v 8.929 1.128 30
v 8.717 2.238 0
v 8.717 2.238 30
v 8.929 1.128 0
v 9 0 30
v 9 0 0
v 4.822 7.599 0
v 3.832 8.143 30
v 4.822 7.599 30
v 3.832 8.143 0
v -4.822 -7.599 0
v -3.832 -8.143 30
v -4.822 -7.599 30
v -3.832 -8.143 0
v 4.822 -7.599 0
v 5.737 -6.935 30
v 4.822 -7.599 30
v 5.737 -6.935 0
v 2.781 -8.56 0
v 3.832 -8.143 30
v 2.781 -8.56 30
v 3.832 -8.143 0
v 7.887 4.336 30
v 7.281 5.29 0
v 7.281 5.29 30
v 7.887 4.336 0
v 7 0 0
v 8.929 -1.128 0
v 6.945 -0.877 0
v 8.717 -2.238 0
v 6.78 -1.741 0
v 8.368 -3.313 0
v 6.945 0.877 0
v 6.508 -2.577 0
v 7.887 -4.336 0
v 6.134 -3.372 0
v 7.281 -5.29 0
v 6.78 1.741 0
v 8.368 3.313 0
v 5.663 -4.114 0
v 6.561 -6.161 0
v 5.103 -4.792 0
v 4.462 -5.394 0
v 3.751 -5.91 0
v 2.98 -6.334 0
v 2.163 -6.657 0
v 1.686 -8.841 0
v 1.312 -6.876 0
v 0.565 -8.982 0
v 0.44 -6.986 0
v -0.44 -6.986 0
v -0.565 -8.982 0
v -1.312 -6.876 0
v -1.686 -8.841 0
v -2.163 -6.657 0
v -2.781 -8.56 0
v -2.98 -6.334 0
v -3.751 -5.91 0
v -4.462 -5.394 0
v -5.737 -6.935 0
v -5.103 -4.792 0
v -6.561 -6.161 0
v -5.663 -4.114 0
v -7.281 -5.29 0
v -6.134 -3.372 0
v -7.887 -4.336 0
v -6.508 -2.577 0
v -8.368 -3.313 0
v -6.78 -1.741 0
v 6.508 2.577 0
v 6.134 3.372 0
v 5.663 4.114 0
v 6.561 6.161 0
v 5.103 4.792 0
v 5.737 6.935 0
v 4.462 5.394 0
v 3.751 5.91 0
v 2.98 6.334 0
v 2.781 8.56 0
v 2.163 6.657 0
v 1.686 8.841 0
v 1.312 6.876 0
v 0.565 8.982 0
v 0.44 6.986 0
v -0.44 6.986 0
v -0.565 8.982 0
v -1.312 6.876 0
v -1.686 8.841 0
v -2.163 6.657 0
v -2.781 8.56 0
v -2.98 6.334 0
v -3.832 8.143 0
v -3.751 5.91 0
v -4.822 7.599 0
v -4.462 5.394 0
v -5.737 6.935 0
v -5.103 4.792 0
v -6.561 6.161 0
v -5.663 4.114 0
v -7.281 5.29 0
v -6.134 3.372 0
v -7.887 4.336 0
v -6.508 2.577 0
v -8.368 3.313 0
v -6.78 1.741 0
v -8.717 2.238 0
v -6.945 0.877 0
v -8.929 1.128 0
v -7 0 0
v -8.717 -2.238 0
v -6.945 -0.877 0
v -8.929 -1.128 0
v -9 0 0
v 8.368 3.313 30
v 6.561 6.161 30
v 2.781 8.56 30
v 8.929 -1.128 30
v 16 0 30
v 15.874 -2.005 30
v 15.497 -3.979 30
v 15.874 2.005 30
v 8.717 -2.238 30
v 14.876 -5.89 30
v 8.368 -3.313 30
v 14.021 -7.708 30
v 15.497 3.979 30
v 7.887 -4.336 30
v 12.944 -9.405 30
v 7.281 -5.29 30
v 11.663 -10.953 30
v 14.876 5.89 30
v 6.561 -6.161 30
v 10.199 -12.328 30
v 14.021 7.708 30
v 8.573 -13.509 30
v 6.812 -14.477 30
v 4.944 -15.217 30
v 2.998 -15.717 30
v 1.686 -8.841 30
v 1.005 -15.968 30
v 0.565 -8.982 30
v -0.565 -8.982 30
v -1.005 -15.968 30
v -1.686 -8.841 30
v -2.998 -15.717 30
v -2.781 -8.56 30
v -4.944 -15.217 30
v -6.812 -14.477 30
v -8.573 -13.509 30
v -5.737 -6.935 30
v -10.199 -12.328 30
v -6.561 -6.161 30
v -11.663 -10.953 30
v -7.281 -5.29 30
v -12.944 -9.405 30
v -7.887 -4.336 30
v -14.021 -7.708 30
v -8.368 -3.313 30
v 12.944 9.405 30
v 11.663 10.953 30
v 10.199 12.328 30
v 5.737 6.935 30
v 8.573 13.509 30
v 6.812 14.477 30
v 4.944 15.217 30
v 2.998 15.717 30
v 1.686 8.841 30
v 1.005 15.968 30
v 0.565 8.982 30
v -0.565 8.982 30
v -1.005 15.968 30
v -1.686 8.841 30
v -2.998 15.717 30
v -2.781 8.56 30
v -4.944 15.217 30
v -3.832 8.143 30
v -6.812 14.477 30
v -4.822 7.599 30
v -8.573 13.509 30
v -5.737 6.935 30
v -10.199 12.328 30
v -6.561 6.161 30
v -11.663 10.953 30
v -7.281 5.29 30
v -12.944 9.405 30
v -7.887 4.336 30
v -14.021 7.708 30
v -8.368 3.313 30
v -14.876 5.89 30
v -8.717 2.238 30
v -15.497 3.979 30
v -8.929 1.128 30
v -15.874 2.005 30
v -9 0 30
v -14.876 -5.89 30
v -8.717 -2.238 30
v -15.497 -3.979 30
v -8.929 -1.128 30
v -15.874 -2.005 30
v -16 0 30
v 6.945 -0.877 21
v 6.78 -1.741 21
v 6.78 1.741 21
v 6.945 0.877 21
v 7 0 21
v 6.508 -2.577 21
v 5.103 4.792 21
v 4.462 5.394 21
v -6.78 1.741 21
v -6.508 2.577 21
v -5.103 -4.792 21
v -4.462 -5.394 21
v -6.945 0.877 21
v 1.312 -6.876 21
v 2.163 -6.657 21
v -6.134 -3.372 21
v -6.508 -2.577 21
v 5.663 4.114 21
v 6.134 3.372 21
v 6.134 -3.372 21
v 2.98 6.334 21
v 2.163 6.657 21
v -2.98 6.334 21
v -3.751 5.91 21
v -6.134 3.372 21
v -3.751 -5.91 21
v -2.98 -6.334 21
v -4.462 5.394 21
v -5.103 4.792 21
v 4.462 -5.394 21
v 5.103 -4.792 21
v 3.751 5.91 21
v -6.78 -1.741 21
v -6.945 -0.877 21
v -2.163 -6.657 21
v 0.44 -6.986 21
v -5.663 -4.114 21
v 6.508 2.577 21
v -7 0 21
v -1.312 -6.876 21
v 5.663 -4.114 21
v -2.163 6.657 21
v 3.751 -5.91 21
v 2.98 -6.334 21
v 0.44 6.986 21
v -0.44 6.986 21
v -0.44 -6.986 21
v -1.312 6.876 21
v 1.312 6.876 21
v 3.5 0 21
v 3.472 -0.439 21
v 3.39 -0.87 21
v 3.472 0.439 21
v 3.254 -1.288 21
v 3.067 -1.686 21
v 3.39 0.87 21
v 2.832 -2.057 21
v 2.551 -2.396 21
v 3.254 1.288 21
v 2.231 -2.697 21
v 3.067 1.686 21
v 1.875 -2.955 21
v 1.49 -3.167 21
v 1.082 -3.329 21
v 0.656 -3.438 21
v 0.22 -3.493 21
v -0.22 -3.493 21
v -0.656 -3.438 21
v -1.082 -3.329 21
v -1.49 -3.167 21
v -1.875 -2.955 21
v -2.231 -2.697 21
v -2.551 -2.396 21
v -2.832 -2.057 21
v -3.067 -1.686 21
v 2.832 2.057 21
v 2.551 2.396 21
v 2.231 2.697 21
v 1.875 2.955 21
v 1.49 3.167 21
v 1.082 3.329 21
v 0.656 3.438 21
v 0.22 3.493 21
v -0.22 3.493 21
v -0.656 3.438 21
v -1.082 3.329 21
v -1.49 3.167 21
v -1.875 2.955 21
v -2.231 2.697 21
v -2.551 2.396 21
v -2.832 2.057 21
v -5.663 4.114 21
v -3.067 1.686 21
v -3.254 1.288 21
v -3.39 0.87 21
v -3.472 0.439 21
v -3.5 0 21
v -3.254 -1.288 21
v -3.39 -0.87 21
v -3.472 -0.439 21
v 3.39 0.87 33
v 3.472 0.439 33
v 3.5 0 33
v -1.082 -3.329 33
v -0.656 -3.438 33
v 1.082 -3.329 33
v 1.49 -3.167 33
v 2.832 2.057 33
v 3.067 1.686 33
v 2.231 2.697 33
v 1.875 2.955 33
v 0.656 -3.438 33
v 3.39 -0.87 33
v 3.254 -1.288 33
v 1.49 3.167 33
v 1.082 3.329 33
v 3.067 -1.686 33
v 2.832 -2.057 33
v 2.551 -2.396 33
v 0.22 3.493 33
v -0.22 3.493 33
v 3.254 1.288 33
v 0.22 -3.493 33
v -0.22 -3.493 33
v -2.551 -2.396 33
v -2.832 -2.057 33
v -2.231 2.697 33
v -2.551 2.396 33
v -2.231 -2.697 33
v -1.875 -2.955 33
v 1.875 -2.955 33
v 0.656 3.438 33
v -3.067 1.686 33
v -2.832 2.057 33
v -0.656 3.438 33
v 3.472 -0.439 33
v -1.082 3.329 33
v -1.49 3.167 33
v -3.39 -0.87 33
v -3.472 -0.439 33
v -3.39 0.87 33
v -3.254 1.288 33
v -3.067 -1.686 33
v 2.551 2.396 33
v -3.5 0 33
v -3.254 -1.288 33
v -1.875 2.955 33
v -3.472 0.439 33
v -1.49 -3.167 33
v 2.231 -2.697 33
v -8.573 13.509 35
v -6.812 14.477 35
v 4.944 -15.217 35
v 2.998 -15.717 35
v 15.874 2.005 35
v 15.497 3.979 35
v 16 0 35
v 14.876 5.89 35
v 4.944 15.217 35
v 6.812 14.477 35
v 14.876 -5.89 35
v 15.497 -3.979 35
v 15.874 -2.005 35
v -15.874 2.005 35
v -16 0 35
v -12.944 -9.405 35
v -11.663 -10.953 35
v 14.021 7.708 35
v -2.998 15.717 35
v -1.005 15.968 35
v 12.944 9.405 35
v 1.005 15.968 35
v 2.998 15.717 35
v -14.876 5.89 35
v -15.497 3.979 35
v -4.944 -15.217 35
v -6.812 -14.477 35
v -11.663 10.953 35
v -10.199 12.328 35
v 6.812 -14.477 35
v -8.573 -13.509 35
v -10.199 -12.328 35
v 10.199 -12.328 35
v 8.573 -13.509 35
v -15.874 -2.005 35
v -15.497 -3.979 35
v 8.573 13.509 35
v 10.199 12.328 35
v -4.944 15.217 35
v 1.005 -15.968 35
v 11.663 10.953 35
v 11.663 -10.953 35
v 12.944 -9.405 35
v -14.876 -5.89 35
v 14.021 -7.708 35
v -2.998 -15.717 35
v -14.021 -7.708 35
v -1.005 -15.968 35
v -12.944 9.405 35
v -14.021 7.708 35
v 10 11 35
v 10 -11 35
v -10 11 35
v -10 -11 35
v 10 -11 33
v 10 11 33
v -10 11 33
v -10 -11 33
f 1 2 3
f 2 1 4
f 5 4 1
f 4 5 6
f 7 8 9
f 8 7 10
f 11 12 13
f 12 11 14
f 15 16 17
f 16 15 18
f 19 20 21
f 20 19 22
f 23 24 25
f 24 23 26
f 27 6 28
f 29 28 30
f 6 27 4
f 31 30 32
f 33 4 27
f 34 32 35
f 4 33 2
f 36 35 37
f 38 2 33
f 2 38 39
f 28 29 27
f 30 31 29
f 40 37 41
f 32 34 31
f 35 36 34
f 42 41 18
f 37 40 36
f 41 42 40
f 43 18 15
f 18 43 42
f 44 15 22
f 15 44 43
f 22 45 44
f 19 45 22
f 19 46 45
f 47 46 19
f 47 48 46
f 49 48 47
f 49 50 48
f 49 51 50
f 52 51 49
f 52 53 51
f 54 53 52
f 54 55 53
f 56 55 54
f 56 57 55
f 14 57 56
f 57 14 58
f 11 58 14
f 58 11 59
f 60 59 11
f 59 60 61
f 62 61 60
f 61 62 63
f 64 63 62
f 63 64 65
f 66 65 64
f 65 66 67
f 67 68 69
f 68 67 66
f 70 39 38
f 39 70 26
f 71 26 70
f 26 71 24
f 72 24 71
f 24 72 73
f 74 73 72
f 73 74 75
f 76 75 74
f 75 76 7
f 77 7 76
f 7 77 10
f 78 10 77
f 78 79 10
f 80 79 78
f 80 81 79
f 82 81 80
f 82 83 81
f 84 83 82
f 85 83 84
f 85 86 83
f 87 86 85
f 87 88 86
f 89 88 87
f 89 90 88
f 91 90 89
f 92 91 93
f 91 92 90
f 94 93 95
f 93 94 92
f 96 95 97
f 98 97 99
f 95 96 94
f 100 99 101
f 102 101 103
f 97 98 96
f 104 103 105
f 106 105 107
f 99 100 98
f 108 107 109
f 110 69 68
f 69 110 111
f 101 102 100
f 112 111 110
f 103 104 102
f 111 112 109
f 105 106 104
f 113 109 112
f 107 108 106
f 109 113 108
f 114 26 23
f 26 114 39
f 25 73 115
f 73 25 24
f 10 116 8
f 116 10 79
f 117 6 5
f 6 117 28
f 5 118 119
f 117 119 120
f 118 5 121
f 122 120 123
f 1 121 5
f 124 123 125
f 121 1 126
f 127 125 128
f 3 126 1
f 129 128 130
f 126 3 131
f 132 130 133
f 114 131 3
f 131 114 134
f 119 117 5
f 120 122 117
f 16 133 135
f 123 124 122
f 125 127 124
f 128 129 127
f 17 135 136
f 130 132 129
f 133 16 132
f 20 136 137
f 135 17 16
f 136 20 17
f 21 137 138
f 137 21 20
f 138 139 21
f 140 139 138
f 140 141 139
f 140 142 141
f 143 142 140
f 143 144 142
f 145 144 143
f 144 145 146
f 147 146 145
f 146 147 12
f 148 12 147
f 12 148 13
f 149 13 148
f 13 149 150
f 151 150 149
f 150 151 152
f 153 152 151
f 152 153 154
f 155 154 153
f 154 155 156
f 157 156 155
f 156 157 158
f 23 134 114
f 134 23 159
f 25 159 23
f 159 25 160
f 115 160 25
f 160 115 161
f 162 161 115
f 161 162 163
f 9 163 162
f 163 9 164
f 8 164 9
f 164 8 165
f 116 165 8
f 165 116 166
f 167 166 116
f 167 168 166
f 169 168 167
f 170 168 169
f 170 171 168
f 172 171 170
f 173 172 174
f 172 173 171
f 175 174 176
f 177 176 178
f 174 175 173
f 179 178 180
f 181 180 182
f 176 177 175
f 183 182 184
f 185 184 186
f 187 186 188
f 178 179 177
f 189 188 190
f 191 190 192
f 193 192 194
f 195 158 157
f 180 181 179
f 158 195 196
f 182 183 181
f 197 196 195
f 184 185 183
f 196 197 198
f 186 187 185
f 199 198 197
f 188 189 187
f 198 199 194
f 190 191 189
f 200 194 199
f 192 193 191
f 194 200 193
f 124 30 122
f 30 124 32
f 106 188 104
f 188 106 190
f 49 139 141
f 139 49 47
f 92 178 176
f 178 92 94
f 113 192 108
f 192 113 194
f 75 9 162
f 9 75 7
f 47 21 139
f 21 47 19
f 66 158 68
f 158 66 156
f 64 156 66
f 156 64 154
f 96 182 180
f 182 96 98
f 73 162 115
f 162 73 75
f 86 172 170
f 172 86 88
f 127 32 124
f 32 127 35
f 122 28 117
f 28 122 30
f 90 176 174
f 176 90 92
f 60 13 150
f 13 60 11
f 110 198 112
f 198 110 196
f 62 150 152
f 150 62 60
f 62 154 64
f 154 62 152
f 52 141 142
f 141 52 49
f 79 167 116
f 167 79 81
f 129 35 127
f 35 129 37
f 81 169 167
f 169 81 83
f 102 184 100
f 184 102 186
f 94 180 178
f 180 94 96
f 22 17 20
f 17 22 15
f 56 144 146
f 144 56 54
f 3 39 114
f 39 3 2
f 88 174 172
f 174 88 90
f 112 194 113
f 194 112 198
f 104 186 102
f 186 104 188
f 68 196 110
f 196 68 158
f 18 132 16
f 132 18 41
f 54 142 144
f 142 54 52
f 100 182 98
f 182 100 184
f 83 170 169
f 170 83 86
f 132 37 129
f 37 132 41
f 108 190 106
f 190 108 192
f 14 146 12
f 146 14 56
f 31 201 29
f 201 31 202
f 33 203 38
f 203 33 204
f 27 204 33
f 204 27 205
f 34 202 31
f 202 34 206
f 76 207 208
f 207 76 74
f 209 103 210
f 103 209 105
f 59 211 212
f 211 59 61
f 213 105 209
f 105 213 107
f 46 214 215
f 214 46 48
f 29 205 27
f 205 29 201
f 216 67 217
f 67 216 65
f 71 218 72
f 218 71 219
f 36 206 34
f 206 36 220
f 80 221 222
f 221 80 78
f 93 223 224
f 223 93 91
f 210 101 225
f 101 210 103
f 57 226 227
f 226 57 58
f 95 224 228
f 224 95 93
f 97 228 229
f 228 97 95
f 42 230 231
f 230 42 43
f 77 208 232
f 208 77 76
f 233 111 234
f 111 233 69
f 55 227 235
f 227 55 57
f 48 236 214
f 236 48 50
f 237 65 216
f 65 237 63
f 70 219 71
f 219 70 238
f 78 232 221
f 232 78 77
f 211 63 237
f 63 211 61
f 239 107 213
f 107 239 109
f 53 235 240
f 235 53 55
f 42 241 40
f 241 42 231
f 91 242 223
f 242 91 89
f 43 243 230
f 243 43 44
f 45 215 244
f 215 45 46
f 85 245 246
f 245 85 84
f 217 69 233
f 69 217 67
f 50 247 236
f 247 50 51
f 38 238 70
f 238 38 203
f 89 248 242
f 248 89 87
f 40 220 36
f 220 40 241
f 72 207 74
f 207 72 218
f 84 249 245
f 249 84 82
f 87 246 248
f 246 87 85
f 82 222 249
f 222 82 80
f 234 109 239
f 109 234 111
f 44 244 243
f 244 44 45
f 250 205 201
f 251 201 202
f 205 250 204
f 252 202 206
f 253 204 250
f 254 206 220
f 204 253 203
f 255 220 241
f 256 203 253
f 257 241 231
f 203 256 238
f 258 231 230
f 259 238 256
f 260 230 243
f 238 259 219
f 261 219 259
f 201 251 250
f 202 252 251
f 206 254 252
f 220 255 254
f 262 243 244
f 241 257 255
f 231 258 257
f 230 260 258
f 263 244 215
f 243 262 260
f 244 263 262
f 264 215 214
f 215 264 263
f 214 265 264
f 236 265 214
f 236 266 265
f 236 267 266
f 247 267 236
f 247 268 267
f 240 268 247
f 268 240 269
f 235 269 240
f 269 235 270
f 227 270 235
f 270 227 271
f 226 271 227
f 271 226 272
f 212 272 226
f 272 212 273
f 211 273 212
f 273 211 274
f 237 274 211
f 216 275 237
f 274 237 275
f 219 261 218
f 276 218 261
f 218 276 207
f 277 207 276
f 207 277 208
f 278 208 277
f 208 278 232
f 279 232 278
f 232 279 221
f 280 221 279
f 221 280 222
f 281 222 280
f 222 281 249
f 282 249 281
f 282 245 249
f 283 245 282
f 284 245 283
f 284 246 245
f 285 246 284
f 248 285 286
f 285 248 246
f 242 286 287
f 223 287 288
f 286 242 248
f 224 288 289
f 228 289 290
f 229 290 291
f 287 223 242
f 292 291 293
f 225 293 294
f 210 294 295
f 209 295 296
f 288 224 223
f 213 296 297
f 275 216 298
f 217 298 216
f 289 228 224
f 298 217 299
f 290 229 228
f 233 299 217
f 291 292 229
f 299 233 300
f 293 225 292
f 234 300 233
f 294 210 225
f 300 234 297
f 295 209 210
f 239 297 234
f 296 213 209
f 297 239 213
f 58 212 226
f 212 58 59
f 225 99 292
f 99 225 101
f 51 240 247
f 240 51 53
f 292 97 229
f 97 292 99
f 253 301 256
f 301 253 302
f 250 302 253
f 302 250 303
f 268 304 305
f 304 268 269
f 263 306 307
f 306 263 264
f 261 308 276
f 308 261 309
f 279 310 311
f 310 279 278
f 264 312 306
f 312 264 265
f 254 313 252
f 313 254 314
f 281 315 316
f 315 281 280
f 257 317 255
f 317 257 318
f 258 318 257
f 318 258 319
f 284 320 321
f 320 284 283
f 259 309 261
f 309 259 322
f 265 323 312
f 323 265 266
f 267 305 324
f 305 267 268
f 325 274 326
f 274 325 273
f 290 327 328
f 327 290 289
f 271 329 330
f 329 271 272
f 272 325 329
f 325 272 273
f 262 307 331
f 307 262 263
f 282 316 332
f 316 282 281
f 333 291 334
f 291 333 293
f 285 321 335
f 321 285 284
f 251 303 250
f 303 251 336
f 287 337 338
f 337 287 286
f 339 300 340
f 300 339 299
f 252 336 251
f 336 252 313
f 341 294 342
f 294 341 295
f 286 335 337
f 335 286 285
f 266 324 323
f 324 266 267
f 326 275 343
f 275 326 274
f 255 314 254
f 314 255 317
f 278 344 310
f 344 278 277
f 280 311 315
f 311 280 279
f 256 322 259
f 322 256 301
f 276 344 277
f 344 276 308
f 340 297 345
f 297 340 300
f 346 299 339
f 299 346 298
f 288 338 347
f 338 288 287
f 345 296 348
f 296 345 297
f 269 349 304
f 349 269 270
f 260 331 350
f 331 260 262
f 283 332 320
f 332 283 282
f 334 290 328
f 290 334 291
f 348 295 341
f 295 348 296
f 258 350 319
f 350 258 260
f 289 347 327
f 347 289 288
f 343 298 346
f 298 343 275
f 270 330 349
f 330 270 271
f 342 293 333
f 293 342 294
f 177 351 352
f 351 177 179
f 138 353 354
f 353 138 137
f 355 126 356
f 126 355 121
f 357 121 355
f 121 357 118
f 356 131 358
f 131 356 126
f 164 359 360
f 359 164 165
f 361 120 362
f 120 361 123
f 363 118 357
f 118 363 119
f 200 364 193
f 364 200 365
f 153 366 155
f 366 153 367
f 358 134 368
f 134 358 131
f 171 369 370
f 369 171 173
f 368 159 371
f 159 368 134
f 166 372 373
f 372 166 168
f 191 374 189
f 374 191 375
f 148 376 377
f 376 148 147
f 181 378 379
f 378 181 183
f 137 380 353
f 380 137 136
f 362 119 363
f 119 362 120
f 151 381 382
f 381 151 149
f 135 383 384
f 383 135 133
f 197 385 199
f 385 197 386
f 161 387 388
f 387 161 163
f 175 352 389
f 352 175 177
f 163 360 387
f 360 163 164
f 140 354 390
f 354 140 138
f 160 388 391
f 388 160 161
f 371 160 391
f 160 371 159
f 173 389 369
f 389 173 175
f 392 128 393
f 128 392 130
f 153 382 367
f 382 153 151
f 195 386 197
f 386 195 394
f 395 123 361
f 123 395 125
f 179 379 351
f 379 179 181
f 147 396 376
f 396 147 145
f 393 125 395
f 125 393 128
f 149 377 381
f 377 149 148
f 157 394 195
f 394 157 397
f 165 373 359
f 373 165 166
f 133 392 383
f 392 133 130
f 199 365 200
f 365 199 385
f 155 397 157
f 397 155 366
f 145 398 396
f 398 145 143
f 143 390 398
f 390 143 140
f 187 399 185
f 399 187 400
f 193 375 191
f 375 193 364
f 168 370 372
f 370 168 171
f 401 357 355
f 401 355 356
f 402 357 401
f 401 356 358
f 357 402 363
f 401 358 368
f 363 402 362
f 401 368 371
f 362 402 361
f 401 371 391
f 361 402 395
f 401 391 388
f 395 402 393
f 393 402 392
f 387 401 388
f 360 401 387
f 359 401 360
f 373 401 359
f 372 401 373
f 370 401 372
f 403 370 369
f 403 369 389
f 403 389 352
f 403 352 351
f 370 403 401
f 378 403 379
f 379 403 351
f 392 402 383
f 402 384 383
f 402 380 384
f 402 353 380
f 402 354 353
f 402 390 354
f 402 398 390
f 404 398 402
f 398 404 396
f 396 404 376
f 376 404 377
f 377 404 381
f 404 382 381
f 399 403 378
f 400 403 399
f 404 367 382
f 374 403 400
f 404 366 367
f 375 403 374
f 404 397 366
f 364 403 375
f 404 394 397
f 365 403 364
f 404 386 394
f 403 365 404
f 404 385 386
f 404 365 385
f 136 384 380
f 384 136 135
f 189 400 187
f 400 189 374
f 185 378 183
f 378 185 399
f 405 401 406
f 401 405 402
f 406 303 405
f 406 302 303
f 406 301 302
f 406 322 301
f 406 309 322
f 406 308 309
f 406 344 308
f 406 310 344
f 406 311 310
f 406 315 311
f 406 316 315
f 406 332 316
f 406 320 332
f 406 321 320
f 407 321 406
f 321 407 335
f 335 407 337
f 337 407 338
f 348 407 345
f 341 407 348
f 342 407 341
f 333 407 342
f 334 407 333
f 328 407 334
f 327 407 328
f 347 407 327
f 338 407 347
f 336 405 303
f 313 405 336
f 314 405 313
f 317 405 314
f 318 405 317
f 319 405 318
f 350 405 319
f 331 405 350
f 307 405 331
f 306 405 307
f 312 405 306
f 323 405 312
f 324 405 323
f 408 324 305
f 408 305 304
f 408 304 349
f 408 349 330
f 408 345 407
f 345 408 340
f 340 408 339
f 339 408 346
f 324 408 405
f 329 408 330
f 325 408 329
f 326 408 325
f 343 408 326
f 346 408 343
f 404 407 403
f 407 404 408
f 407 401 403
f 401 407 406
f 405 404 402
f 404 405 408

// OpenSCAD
MOUNT_HEIGHT = 5;
MOUNT_DIA = 32;

MOUNT_INNER_WIDTH = 20;
MOUNT_INNER_LENGTH = 22;
MOUNT_INNER_HEIGHT = 2;
MOUNT_HOLE_DIA = 7;
MOUNT_SCREW_LENGTH = 12;
MOUNT_SCREW_HEAD_DIA = 14;

PIPE_INSERT_INNER_DIA = 18;
PIPE_INSERT_LENGTH = 30;


$fn = 50;

union() {
    difference() {
        cylinder(d = PIPE_INSERT_INNER_DIA, h = PIPE_INSERT_LENGTH);
        cylinder(d = MOUNT_SCREW_HEAD_DIA, h = PIPE_INSERT_LENGTH - (MOUNT_SCREW_LENGTH - (MOUNT_HEIGHT - MOUNT_INNER_HEIGHT)));
        cylinder(d = MOUNT_HOLE_DIA, h = PIPE_INSERT_LENGTH);        
    }
    
    translate([0, 0, PIPE_INSERT_LENGTH])
    difference() {
        cylinder(d = MOUNT_DIA, h = MOUNT_HEIGHT);

        translate([-MOUNT_INNER_WIDTH/2, -MOUNT_INNER_LENGTH/2, MOUNT_HEIGHT - MOUNT_INNER_HEIGHT])
        cube(size = [MOUNT_INNER_WIDTH, MOUNT_INNER_LENGTH, MOUNT_INNER_HEIGHT]);
        
        cylinder(d = MOUNT_HOLE_DIA, h = MOUNT_HEIGHT);
    }
}
